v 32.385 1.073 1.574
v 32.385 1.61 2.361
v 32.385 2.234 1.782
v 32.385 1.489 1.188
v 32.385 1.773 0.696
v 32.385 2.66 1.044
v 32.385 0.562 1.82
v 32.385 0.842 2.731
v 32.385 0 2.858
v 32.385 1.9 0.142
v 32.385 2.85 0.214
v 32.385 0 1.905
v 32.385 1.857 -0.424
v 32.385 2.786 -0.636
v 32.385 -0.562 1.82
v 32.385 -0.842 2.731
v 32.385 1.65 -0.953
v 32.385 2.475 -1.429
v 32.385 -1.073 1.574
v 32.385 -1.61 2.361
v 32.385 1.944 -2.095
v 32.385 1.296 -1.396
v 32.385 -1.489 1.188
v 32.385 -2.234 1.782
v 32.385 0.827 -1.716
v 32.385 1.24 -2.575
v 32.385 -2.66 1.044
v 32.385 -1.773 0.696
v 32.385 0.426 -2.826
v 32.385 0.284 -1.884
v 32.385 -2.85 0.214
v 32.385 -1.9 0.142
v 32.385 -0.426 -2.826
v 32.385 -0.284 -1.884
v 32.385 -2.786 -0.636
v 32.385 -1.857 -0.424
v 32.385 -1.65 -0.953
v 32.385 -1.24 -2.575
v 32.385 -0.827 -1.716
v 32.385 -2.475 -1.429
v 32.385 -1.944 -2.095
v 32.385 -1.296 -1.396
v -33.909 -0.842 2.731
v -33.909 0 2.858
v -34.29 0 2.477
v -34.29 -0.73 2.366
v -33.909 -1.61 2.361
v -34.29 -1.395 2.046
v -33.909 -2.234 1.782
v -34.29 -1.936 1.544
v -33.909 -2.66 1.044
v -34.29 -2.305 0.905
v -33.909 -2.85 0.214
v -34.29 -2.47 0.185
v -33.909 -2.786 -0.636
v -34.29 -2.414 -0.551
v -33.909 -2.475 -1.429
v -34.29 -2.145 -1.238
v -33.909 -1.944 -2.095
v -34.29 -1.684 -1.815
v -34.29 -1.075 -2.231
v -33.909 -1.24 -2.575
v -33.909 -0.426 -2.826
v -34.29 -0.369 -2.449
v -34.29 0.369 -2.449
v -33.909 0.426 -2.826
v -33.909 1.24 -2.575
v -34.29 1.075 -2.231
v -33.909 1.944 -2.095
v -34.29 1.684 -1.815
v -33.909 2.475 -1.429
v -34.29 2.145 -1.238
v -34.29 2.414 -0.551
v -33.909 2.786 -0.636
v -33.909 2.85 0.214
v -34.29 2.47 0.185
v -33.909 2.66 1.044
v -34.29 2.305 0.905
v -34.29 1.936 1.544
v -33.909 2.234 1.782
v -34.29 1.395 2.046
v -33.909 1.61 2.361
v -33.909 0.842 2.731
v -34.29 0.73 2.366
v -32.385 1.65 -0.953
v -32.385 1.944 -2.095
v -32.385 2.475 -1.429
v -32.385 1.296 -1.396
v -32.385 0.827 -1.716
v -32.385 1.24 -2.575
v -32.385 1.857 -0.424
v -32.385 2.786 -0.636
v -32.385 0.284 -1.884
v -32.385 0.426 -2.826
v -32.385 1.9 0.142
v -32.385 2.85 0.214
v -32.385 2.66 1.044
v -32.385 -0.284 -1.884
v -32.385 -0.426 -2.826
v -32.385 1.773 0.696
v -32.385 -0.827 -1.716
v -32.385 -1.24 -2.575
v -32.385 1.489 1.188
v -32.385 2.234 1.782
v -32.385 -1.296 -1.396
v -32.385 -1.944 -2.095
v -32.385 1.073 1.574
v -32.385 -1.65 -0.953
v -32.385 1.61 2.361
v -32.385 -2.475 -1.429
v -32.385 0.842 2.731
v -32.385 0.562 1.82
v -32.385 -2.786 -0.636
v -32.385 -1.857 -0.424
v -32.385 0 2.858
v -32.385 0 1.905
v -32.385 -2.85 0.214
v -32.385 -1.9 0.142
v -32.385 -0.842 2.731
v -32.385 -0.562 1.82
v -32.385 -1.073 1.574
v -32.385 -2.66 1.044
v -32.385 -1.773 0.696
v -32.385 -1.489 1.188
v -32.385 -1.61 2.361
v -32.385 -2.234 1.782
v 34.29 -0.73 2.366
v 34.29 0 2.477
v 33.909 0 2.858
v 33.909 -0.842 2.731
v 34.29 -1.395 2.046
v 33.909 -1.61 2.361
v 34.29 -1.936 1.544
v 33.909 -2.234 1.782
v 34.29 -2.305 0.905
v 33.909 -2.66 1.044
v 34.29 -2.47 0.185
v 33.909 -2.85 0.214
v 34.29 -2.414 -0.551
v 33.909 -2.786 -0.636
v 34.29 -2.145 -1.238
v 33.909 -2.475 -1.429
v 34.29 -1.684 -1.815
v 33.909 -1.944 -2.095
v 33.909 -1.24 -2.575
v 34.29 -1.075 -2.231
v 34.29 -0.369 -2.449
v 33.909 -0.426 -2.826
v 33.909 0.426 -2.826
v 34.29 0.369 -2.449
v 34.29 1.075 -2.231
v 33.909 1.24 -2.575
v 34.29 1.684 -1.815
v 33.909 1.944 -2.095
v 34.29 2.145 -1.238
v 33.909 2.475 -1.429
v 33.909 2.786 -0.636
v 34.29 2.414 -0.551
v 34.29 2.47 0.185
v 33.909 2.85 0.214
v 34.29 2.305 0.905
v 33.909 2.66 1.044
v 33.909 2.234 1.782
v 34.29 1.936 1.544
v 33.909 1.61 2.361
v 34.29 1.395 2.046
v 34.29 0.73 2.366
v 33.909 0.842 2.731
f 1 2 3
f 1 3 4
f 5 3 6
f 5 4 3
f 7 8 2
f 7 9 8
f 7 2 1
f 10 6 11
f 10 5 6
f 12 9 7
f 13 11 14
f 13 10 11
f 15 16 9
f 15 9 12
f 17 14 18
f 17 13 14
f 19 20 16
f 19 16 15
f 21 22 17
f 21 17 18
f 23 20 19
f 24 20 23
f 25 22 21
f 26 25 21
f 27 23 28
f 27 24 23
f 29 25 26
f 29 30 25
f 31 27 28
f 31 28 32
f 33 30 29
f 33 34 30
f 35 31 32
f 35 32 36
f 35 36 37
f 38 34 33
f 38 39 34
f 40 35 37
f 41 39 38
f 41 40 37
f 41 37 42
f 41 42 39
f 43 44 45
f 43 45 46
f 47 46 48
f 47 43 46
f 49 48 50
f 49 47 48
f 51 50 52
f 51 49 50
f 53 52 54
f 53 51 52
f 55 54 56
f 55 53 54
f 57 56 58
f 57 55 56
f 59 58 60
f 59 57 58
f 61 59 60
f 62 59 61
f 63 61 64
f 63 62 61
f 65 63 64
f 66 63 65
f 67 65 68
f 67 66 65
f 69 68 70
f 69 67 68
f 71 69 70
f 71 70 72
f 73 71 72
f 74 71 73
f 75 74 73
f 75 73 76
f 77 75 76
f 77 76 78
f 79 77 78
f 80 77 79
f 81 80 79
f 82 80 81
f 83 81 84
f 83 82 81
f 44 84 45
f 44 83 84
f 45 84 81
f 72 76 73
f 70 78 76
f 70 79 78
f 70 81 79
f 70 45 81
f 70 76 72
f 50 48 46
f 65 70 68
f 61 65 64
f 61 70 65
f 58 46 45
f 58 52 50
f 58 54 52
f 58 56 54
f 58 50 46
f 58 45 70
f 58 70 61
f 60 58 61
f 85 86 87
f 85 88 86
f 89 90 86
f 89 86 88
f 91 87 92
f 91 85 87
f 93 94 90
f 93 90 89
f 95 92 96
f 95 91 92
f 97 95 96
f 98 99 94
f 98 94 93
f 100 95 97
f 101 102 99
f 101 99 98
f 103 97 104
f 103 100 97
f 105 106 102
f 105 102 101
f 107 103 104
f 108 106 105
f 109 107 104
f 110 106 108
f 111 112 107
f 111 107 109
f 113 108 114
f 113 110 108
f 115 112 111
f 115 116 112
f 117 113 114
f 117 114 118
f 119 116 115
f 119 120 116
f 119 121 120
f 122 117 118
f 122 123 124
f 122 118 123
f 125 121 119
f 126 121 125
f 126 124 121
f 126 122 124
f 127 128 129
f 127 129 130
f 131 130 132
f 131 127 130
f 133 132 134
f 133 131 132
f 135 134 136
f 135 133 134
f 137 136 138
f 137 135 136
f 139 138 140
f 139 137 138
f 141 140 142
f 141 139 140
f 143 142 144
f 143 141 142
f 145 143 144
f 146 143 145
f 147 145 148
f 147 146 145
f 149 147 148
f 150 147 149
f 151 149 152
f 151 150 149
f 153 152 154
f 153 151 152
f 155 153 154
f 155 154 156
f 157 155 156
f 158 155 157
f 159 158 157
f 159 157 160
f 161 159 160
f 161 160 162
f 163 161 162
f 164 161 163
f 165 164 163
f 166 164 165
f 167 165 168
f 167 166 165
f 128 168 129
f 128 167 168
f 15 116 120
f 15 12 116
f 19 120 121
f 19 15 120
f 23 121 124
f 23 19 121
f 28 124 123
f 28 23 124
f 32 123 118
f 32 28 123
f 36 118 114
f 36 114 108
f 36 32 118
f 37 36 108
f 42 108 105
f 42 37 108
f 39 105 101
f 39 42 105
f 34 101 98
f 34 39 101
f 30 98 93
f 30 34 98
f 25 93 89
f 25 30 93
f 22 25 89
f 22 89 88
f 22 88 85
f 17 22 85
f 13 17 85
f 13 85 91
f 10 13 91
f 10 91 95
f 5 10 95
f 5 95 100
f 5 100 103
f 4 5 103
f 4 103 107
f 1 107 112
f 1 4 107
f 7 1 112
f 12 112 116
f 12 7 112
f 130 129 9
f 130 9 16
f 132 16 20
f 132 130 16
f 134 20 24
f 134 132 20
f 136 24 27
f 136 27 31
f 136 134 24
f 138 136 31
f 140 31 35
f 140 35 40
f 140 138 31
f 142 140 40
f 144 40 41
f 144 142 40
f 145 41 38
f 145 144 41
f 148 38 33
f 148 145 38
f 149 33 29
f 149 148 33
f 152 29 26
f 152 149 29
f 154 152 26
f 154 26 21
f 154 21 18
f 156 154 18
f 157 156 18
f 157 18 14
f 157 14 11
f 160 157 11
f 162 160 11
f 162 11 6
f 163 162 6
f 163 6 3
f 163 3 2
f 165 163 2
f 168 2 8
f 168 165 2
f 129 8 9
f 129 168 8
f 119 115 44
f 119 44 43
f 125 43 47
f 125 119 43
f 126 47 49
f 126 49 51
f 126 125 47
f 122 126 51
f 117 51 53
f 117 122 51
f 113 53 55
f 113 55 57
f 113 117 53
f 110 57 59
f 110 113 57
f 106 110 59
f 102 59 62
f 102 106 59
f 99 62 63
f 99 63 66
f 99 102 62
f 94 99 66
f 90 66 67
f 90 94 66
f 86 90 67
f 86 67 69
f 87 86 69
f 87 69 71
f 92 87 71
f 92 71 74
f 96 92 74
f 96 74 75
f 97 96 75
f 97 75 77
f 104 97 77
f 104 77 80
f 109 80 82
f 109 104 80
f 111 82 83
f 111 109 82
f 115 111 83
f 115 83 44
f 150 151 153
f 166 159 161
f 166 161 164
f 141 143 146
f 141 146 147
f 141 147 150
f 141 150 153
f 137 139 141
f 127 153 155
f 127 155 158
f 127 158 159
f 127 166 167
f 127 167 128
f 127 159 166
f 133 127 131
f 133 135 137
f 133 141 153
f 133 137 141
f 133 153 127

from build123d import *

# Parameters (mm, degrees)
CHAMFER1_SIZE = 0.254
SCALE1_SCALE  = 1.5


with BuildPart() as part:
    # Sketch1 → Revolve1 (revolve)
    with BuildSketch(Plane.XY, mode=Mode.PRIVATE) as revolve1_sk:
        Polygon((-22.86, 0), (-22.86, 1.905), (-21.59, 1.905), (-21.59, 1.27), (21.59, 1.27), (21.59, 1.905), (22.86, 1.905), (22.86, 0), align=None)
    revolve(revolve1_sk.sketch.rotate(Axis((-22.86, 0, 0), (1, 0, 0)), 90), axis=Axis((-22.86, 0, 0), (1, 0, 0)))

    # Chamfer1
    chamfer1_edges = [part.edges().sort_by_distance(p)[0] for p in [
        (22.86, 0, -1.905),
        (-22.86, 0, -1.905),
    ]]
    chamfer(chamfer1_edges, length=CHAMFER1_SIZE)


with BuildPart() as part_1:
    # Scale1: scaled about (0, 0, 0)
    add(part.part.scale(SCALE1_SCALE))


solid = part_1.part
